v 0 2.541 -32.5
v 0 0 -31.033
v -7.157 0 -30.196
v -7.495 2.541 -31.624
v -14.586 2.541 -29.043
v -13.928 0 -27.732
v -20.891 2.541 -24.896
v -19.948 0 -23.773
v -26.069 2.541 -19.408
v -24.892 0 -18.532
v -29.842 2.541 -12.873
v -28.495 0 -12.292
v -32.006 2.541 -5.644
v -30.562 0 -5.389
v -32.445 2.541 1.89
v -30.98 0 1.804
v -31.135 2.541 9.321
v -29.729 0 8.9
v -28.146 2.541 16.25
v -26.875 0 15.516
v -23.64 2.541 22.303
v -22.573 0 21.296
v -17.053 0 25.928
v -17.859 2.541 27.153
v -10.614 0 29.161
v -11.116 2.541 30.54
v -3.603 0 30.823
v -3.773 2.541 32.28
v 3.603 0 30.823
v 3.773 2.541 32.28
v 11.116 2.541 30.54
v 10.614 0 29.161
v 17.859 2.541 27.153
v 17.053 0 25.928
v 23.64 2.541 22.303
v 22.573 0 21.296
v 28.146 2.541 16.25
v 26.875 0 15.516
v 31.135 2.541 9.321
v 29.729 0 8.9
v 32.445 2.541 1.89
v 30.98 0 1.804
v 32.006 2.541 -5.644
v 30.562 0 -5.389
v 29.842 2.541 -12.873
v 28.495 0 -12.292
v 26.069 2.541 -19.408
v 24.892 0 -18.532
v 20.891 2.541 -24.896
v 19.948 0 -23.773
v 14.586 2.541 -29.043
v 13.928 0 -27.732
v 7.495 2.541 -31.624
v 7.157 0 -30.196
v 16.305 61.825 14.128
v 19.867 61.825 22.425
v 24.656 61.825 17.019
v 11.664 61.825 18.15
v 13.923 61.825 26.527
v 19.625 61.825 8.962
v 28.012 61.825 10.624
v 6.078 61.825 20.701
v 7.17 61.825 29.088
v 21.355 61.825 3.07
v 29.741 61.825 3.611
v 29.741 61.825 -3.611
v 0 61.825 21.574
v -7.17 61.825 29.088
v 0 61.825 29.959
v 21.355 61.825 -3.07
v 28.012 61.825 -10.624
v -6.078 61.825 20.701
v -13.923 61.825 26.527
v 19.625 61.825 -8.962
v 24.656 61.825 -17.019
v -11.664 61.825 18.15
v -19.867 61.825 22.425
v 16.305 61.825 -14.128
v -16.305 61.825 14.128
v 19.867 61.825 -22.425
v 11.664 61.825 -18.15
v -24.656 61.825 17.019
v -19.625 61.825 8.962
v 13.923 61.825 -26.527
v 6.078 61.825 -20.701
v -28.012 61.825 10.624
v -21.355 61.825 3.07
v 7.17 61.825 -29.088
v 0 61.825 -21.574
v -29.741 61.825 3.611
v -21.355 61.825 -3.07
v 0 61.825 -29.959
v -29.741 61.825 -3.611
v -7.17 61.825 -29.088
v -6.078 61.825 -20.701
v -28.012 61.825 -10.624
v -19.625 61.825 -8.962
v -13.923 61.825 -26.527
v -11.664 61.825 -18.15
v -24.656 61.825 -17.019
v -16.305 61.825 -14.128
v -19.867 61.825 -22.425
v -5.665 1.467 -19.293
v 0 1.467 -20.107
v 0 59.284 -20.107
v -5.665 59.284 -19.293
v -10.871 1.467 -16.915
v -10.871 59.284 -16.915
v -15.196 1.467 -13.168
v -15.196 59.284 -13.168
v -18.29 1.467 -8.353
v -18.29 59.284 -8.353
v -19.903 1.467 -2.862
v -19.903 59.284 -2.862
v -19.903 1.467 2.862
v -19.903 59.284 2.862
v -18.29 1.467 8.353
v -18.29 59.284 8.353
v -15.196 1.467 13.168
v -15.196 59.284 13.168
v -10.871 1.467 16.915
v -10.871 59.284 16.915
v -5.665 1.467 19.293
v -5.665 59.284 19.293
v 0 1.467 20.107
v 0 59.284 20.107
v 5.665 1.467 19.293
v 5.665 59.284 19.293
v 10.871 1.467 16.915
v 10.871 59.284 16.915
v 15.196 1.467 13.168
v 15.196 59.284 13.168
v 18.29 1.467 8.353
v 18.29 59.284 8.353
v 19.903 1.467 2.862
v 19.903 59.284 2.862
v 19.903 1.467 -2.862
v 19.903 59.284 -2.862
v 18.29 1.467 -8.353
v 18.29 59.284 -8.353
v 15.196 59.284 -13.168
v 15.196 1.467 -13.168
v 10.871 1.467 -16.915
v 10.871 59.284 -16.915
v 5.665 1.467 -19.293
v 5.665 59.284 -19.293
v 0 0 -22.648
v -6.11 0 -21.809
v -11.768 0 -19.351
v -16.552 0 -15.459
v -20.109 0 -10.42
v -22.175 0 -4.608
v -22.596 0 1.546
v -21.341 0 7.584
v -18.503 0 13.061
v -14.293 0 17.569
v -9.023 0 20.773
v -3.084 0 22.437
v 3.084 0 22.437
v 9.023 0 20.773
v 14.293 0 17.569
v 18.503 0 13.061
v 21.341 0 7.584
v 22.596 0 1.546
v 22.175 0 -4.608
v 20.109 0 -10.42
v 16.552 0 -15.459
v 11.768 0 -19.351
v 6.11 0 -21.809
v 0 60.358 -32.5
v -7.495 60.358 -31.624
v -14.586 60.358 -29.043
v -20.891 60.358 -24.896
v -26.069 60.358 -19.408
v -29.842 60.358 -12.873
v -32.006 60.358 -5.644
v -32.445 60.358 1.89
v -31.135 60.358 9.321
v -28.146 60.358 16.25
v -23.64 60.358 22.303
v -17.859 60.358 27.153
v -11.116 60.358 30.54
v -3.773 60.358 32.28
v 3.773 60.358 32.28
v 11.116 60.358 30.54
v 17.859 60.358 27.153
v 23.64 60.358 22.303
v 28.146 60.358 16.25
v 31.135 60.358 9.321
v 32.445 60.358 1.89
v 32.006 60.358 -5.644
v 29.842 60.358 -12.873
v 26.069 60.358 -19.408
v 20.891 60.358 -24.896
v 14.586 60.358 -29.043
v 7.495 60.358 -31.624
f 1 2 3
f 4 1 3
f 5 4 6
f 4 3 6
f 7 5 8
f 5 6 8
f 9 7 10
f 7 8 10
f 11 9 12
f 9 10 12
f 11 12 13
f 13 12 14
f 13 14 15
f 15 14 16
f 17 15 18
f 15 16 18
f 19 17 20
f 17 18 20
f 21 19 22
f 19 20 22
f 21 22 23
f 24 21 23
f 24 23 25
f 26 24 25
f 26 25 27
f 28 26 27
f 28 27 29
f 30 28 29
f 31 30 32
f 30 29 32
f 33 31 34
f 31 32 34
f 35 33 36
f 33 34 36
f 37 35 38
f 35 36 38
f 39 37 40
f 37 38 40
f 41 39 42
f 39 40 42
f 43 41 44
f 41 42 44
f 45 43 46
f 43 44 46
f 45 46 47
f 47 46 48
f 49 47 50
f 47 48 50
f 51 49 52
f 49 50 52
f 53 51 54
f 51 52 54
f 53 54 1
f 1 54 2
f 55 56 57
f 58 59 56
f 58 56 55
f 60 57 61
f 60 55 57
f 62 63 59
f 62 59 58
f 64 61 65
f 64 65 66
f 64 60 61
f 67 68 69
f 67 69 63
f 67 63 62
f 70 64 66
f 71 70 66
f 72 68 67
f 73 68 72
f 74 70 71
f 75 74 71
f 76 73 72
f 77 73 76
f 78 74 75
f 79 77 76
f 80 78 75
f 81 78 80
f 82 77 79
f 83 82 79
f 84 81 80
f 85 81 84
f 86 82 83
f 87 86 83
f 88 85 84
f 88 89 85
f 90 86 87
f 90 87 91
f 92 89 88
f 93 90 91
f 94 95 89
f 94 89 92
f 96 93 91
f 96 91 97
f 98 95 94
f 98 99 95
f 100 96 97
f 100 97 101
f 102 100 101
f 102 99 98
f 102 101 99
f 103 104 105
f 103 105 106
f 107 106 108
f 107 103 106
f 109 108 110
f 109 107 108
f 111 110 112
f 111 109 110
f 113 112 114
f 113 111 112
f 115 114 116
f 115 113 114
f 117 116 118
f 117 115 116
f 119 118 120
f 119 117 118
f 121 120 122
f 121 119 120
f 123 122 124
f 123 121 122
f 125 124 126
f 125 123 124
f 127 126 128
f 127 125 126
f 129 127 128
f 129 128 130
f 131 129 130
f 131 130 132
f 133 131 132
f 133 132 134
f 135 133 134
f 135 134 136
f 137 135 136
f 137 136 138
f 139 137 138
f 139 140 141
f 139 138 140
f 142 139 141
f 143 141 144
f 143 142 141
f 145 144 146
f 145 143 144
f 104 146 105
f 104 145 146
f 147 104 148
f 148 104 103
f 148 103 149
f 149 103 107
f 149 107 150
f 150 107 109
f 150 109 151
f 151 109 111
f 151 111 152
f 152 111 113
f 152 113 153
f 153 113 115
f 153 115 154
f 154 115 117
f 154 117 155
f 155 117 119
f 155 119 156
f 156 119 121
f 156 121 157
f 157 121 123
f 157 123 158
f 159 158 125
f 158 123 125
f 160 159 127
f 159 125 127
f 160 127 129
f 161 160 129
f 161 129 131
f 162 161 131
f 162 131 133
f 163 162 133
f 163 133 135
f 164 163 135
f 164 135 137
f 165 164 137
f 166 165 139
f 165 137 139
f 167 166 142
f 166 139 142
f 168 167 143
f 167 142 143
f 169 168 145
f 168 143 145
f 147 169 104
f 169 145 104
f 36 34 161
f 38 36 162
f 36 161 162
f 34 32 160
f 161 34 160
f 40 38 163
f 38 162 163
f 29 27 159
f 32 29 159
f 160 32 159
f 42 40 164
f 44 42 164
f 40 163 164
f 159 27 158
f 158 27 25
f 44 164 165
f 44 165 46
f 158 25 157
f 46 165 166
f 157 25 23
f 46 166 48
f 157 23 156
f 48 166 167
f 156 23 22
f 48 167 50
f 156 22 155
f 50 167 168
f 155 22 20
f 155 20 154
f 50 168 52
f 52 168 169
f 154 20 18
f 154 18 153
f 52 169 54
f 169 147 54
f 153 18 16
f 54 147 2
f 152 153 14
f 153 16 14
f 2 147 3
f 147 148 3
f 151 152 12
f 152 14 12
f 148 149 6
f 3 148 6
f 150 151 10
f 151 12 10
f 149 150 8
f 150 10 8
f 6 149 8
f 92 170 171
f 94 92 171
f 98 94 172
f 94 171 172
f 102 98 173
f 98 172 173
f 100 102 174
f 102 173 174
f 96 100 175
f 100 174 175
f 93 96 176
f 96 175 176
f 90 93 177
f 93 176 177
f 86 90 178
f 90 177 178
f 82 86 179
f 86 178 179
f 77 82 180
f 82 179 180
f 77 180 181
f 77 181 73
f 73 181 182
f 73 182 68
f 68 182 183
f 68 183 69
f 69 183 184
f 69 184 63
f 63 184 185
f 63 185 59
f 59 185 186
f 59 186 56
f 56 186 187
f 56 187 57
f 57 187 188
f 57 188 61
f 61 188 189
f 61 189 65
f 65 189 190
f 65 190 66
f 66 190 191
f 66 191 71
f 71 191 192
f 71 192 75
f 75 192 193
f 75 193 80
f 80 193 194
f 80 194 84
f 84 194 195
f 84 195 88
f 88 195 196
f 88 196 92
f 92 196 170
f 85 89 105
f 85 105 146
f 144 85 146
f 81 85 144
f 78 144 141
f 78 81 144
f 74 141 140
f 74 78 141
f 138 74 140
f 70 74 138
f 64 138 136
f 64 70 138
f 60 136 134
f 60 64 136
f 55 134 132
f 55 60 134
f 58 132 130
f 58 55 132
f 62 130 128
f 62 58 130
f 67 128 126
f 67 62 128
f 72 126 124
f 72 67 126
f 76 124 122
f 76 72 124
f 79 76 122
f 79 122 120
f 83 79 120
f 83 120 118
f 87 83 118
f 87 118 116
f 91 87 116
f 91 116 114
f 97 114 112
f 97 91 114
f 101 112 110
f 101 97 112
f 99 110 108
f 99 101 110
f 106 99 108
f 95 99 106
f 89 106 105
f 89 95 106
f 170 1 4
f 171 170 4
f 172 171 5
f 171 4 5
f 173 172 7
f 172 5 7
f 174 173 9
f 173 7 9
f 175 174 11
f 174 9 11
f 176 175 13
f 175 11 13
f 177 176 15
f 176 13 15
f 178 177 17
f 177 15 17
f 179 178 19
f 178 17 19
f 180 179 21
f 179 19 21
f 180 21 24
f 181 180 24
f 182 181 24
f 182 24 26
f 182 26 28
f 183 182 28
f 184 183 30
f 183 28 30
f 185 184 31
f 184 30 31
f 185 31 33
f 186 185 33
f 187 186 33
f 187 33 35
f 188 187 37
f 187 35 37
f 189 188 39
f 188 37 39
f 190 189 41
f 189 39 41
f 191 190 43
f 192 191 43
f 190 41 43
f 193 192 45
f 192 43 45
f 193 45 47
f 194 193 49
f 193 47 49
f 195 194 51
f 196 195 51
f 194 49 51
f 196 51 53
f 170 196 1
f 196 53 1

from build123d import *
from OCP.BRepFilletAPI import BRepFilletAPI_MakeChamfer

# Parameters (mm, degrees)
SKETCH1_R           = 32.5
BOSS_EXTRUDE1_DEPTH = 61.824831675
SKETCH2_R           = 20.107463758
CUT_EXTRUDE1_DEPTH  = 78.037716813
CHAMFER1_SIZE       = 1.467030898
CHAMFER1_SIZE2      = 2.540972052


with BuildPart() as part:
    # Sketch1 → Boss-Extrude1 (new body)
    with BuildSketch(Plane(origin=(0, 0, 0), x_dir=(1, 0, 0), z_dir=(0, 1, 0))):
        Circle(SKETCH1_R)
    extrude(amount=BOSS_EXTRUDE1_DEPTH)

    # Sketch2 → Cut-Extrude1 (cut, through all)
    with BuildSketch(Plane(origin=(0, 0, 0), x_dir=(1, 0, 0), z_dir=(0, 1, 0))):
        Circle(SKETCH2_R)
    extrude(amount=CUT_EXTRUDE1_DEPTH, mode=Mode.SUBTRACT)

    # Chamfer1: one chamfer whose edges measure the first distance from different faces: ONE call of the kernel's chamfer builder (chamfer() names one face for all edges)
    chamfer1_edges_1 = [part.edges().sort_by_distance(p)[0] for p in [
        (-20.107463758, 61.824831675, 0),
    ]]
    chamfer1_side_1 = [part.faces().sort_by_distance(p)[0] for p in [
        (-31.580761184, 61.824831675, 0),
    ]]
    chamfer1_edges_2 = [part.edges().sort_by_distance(p)[0] for p in [
        (-20.107463758, 0, 0),
    ]]
    chamfer1_side_2 = [part.faces().sort_by_distance(p)[0] for p in [
        (-20.107463758, 30.912415838, 0),
    ]]
    chamfer1_edges_3 = [part.edges().sort_by_distance(p)[0] for p in [
        (-32.5, 0, 0),
    ]]
    chamfer1_side_3 = [part.faces().sort_by_distance(p)[0] for p in [
        (-31.580761184, 0, 0),
    ]]
    chamfer1_edges_4 = [part.edges().sort_by_distance(p)[0] for p in [
        (-32.5, 61.824831675, 0),
    ]]
    chamfer1_side_4 = [part.faces().sort_by_distance(p)[0] for p in [
        (-32.5, 30.912415838, 0),
    ]]
    chamfer1 = BRepFilletAPI_MakeChamfer(part.part.solid().wrapped)
    for e in chamfer1_edges_1:
        chamfer1.Add(CHAMFER1_SIZE, CHAMFER1_SIZE2, e.wrapped, chamfer1_side_1[0].wrapped)  # the first distance lies on this face
    for e in chamfer1_edges_2:
        chamfer1.Add(CHAMFER1_SIZE, CHAMFER1_SIZE2, e.wrapped, chamfer1_side_2[0].wrapped)  # the first distance lies on this face
    for e in chamfer1_edges_3:
        chamfer1.Add(CHAMFER1_SIZE, CHAMFER1_SIZE2, e.wrapped, chamfer1_side_3[0].wrapped)  # the first distance lies on this face
    for e in chamfer1_edges_4:
        chamfer1.Add(CHAMFER1_SIZE, CHAMFER1_SIZE2, e.wrapped, chamfer1_side_4[0].wrapped)  # the first distance lies on this face
    add(Compound.cast(chamfer1.Shape()), mode=Mode.REPLACE)


solid = part.part
